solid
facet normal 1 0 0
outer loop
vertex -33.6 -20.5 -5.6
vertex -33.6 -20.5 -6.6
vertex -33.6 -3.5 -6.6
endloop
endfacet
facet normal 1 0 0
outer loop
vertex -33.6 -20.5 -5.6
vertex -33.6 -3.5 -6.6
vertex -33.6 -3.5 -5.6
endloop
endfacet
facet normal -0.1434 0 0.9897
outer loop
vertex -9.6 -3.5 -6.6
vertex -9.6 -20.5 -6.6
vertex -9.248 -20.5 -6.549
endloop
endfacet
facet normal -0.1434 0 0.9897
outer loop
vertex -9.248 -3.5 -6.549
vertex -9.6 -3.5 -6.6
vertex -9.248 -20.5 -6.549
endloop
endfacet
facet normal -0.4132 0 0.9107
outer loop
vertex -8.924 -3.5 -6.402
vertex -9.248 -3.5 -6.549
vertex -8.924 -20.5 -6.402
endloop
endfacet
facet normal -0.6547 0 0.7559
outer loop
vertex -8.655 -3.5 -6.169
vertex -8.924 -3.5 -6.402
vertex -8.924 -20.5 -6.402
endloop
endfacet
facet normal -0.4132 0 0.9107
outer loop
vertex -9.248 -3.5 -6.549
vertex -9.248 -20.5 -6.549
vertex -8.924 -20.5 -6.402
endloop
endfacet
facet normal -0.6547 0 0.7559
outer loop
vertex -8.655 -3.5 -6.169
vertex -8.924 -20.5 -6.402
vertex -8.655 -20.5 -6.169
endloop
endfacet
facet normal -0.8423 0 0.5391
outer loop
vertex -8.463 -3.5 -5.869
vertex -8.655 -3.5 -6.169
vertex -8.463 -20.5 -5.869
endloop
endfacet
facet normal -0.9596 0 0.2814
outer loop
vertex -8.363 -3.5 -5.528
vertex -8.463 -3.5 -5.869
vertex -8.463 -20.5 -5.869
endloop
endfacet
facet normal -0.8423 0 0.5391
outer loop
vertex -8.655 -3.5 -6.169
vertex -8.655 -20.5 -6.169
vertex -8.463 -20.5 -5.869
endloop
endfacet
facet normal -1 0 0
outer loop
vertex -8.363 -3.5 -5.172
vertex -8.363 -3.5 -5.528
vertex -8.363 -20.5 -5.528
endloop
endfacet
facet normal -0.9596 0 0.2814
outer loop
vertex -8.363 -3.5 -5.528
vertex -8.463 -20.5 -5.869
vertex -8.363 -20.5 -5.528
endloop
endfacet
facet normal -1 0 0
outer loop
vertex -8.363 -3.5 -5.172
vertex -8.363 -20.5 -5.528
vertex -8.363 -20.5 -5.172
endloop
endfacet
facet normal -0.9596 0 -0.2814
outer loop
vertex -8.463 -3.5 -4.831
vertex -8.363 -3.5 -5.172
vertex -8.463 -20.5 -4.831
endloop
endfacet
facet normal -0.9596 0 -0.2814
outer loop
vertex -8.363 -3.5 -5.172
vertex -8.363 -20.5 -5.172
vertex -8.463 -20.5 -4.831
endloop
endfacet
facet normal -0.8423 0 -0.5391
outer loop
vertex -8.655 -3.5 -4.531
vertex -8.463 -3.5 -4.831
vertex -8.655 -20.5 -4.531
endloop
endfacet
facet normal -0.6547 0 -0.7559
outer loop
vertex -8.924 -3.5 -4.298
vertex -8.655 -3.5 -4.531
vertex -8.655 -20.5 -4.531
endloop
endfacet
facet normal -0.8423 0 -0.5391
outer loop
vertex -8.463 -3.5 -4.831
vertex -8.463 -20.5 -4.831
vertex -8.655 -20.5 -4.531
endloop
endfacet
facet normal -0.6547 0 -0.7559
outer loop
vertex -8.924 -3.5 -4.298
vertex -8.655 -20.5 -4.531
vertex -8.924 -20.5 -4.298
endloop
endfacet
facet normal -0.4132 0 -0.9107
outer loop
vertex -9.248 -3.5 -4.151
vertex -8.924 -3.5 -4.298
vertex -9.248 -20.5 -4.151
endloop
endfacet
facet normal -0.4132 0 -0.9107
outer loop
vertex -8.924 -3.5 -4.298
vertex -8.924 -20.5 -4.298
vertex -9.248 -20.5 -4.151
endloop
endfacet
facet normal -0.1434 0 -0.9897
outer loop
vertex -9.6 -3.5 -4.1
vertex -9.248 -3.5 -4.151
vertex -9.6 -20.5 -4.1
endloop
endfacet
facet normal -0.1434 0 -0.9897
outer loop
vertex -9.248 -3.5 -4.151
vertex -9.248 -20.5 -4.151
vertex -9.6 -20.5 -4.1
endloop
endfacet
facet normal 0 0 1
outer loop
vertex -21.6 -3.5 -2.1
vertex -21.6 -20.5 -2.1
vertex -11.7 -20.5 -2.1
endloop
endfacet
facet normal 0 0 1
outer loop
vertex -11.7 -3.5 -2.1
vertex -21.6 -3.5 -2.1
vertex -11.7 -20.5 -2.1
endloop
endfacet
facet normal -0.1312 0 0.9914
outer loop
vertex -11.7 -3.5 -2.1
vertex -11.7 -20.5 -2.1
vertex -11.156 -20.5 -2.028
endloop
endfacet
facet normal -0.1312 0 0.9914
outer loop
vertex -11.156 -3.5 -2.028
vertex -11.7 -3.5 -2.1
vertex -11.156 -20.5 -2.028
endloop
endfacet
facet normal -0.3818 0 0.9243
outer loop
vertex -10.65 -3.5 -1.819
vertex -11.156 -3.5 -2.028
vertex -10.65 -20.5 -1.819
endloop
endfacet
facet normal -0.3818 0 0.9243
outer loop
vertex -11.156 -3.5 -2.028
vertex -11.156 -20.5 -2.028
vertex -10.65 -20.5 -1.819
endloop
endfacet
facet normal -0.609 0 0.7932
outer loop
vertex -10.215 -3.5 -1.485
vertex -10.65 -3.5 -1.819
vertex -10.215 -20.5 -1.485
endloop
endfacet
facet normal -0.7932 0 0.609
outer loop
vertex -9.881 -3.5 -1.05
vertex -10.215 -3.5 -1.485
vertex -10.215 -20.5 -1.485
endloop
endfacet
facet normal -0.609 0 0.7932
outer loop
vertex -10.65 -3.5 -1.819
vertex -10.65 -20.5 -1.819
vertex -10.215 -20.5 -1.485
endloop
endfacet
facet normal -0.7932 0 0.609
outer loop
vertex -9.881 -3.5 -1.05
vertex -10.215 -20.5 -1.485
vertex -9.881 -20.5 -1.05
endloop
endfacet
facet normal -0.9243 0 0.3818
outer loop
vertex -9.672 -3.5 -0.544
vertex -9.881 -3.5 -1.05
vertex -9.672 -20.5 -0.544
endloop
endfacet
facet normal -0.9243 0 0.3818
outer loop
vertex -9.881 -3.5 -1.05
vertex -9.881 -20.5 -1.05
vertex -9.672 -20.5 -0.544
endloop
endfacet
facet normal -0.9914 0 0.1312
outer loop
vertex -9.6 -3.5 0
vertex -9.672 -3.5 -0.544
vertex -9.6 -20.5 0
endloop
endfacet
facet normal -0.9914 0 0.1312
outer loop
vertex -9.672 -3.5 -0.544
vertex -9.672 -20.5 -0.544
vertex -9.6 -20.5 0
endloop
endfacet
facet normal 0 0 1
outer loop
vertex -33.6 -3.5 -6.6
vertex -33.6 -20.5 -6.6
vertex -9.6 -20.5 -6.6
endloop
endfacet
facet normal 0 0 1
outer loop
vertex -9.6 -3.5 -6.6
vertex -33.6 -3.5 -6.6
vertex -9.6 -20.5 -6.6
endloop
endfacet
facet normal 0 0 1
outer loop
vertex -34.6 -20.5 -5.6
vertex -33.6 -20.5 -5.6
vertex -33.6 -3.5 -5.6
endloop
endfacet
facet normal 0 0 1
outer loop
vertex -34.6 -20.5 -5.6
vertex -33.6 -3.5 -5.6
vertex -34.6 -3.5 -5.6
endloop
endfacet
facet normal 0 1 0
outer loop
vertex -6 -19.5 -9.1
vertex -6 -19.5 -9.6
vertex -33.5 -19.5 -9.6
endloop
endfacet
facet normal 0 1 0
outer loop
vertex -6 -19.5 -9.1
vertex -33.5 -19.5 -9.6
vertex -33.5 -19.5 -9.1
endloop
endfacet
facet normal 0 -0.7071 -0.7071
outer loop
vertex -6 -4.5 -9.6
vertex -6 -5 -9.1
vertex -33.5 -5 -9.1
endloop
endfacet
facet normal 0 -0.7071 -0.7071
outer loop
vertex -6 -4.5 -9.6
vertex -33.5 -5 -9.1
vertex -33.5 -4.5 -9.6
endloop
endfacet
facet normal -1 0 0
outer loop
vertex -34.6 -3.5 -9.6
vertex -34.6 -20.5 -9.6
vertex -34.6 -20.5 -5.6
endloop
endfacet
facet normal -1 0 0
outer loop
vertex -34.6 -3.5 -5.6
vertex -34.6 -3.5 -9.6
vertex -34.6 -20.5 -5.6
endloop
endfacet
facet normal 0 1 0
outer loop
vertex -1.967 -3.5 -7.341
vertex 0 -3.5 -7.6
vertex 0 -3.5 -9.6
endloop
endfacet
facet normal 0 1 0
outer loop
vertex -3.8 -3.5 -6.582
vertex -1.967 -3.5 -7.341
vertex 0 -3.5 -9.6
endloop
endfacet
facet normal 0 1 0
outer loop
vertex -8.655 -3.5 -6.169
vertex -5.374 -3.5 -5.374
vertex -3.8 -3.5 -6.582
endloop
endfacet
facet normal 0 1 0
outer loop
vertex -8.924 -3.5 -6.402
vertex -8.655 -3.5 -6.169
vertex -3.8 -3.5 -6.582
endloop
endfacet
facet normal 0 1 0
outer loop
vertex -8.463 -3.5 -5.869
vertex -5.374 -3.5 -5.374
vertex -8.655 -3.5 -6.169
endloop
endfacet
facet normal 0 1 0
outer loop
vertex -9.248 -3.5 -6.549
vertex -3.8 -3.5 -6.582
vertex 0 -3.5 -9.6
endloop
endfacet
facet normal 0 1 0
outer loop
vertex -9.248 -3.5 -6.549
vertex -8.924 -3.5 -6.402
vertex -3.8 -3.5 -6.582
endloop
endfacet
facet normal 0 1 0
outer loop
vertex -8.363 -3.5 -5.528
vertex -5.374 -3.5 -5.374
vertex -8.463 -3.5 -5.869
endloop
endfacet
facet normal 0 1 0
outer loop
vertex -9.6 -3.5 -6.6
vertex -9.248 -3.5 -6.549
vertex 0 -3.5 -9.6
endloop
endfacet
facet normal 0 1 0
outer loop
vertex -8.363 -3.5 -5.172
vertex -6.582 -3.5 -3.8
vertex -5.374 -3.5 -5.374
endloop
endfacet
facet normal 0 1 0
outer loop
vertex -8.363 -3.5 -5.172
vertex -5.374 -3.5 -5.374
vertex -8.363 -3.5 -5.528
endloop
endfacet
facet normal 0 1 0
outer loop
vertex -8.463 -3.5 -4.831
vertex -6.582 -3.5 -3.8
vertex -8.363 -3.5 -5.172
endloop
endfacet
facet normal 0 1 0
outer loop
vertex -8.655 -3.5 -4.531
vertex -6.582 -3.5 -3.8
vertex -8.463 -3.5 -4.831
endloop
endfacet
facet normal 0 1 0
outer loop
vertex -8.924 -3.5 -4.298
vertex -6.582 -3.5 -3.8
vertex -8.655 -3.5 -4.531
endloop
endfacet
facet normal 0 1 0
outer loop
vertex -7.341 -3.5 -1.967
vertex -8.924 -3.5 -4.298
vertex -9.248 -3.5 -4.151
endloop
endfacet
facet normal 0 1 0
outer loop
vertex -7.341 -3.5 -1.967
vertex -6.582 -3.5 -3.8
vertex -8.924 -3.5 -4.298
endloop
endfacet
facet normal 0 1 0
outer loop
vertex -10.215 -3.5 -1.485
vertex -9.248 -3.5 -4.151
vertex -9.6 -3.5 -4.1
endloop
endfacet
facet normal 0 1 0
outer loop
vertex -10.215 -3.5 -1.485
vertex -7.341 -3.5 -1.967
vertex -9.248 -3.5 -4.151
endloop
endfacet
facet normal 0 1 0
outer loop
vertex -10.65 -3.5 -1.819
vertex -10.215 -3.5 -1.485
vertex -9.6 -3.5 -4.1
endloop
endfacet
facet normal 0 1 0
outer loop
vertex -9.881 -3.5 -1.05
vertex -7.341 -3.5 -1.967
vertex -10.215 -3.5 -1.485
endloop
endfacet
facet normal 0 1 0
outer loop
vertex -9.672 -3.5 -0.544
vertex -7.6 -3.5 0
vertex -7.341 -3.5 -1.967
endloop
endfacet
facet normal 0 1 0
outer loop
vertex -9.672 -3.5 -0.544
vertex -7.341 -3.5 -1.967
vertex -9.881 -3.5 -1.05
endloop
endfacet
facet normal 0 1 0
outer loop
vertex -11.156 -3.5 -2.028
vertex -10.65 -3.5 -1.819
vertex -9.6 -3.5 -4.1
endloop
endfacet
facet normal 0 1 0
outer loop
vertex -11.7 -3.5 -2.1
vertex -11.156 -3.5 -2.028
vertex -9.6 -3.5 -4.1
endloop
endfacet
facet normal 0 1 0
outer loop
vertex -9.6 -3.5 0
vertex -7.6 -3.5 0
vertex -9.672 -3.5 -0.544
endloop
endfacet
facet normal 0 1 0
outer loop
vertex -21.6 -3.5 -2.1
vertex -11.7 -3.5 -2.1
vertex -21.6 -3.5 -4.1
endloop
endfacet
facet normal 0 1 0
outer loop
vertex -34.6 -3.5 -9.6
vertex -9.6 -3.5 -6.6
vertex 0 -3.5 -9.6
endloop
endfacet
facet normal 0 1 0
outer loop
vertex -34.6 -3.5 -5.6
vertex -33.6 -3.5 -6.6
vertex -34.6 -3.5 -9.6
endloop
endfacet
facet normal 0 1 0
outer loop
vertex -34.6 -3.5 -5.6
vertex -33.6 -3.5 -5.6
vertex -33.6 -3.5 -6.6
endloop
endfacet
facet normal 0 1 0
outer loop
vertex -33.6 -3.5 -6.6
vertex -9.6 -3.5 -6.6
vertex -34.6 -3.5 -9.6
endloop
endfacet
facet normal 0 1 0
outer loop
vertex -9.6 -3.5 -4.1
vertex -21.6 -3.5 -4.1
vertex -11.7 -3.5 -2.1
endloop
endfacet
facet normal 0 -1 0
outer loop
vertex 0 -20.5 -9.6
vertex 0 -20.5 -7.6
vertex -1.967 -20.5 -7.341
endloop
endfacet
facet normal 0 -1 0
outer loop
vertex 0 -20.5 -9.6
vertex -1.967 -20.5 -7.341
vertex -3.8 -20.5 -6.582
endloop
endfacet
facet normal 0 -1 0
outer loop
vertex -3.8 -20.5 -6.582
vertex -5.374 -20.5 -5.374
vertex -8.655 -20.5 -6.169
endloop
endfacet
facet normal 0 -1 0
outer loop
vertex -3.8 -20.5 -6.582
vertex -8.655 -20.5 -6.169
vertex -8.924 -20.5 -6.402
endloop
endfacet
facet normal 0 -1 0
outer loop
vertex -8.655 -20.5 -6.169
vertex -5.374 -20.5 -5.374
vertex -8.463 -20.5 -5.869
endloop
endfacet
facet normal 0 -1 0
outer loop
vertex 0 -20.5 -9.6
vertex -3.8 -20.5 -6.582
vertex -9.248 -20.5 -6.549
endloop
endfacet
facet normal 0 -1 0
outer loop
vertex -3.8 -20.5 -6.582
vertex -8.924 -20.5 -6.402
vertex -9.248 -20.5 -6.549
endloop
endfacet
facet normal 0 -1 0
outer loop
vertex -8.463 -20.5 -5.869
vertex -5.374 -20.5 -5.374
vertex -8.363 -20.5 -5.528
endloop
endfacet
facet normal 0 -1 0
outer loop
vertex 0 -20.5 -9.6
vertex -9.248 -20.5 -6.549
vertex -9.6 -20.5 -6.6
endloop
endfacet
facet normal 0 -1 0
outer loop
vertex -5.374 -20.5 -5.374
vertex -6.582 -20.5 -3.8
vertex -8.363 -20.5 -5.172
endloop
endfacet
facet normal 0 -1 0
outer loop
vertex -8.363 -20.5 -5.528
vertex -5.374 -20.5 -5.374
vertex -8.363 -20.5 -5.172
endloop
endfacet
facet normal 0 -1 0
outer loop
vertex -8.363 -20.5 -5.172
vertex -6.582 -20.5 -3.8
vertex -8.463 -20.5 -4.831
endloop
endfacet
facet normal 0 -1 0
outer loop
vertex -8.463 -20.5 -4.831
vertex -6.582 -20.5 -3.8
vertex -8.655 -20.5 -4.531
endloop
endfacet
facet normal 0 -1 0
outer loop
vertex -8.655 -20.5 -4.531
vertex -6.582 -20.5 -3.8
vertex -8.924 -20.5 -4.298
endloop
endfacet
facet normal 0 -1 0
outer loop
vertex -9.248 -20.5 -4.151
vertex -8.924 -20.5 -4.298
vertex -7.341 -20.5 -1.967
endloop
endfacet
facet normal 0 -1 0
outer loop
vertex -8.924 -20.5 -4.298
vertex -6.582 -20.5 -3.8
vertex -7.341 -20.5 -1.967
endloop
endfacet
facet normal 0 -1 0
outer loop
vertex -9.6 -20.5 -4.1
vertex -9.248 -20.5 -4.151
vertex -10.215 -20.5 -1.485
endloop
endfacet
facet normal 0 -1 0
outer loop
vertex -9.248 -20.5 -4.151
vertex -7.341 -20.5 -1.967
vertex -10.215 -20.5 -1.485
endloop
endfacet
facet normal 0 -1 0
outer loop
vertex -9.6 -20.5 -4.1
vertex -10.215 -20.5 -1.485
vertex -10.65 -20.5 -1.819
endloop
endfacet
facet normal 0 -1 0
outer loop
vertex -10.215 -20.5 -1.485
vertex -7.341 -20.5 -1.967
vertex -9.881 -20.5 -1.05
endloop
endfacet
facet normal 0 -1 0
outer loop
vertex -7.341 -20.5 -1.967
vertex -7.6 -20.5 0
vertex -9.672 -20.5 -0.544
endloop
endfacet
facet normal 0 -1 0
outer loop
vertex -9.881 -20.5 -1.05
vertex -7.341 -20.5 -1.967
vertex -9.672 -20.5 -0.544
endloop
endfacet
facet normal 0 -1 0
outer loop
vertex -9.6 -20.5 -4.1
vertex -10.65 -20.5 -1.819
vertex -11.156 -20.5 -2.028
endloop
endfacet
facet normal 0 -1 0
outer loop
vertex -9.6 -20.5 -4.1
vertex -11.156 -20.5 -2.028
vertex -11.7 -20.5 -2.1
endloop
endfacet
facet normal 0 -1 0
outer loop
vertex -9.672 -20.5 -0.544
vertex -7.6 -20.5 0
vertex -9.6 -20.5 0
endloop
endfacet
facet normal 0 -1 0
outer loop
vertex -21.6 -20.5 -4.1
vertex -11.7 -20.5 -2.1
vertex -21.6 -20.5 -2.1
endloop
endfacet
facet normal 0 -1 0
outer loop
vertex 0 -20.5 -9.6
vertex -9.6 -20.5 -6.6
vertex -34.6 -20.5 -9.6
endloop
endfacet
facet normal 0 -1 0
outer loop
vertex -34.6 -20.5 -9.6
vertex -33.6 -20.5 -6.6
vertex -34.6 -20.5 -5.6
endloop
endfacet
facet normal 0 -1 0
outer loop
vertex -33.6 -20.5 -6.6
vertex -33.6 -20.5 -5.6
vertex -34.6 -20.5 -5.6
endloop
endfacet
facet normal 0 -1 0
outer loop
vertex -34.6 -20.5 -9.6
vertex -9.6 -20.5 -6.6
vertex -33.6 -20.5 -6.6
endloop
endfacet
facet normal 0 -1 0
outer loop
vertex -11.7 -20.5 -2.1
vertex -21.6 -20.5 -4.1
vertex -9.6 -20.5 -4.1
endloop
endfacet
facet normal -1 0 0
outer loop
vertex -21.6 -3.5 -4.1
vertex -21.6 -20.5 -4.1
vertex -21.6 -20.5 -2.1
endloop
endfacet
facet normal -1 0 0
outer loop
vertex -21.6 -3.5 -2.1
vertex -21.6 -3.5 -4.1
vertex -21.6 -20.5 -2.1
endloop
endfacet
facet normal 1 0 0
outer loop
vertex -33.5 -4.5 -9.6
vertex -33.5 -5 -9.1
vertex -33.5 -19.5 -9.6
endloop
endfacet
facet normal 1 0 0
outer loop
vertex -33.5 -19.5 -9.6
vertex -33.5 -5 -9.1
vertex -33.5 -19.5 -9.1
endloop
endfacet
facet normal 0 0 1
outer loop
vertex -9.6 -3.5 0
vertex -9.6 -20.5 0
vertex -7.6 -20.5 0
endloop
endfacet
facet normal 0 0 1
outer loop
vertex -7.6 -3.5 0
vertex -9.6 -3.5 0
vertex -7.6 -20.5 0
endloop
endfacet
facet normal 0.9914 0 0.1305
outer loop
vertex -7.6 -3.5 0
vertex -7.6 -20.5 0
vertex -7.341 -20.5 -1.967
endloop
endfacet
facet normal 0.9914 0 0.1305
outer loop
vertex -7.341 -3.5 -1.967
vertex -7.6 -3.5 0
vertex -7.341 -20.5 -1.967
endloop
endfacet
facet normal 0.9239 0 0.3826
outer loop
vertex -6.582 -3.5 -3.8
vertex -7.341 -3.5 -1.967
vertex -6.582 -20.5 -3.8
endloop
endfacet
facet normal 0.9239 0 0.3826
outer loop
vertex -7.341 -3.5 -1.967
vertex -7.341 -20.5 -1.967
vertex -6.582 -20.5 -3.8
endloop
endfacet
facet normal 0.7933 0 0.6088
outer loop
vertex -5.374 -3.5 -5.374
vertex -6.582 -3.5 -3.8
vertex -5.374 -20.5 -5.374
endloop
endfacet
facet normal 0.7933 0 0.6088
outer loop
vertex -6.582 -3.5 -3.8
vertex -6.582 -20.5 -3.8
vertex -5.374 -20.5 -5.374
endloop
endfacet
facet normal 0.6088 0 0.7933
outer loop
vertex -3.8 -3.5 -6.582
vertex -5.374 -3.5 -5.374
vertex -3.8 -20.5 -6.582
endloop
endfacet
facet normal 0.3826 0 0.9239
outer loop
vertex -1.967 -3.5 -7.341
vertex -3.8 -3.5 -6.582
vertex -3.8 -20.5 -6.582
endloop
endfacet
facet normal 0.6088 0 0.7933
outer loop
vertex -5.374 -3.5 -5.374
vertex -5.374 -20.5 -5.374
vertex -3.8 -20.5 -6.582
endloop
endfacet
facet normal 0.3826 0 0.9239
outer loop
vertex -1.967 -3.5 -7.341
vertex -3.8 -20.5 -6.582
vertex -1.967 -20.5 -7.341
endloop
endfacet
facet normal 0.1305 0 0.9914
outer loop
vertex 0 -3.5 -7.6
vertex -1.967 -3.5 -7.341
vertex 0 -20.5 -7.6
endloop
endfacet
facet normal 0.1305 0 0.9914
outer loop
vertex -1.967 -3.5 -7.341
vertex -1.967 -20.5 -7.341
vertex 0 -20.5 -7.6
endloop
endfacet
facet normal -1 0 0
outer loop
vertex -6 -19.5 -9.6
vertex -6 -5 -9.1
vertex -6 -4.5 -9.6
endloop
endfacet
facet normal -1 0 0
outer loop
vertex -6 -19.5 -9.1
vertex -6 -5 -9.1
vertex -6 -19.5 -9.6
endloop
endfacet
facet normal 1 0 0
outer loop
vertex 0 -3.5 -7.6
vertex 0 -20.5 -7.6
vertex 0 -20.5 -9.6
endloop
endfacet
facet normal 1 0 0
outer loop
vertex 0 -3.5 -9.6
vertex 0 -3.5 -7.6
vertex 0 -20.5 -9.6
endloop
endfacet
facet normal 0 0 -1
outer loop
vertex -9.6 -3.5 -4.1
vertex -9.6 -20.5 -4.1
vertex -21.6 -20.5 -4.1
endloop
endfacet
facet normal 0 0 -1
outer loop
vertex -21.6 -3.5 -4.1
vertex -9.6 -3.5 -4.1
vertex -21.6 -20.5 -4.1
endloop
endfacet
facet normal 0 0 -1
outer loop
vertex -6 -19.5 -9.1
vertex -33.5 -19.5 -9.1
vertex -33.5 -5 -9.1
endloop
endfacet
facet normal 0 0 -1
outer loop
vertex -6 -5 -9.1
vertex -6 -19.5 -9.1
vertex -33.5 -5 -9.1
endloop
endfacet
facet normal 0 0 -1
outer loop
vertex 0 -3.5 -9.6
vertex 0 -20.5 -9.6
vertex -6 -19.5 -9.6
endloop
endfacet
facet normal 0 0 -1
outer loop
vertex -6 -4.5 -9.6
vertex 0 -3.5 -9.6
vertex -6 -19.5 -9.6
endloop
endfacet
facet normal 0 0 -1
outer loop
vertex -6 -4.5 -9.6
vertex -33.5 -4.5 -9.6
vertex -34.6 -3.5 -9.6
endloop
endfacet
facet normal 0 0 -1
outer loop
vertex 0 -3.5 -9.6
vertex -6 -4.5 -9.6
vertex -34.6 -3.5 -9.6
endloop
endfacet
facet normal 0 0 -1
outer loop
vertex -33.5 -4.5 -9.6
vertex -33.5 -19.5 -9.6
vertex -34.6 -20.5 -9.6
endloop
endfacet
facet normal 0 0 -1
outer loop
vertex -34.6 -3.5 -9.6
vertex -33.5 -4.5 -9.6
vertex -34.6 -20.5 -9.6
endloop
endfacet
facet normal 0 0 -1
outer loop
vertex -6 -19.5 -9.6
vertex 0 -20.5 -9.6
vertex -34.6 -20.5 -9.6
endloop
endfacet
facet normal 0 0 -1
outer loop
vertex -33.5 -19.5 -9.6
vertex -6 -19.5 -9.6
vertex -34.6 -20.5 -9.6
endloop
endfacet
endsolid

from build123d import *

# Parameters (mm, degrees)
EXTRUDE015_DEPTH = 27.5
EXTRUDE_DEPTH    = 17


with BuildPart() as extrude015:
    # Sketch020 → Extrude015 (new body)
    with BuildSketch(Plane(origin=(-6, 0, 0), x_dir=(0, -1, 0), z_dir=(-1, 0, 0))):
        Polygon((19.5, -10.1), (19.5, -9.1), (5, -9.1), (4, -10.1), align=None)
    extrude(amount=EXTRUDE015_DEPTH)


with BuildPart() as cut006:
    # Sketch001 → Extrude (new body)
    with BuildSketch(Plane.XZ.offset(25)):
        with BuildLine():
            ThreePointArc((-7.6, 0), (-5.374012, -5.374012), (0, -7.6))
            Line((0, -7.6), (0, -9.6))
            Line((0, -9.6), (-34.6, -9.6))
            Line((-34.6, -9.6), (-34.6, -5.6))
            Line((-33.6, -5.6), (-34.6, -5.6))
            Line((-33.6, -6.6), (-33.6, -5.6))
            Line((-33.6, -6.6), (-9.6, -6.6))
            ThreePointArc((-9.6, -6.6), (-8.35, -5.35), (-9.6, -4.1))
            Line((-9.6, -4.1), (-21.6, -4.1))
            Line((-21.6, -4.1), (-21.6, -2.1))
            Line((-21.6, -2.1), (-11.7, -2.1))
            ThreePointArc((-11.7, -2.1), (-10.215076, -1.484924), (-9.6, 0))
            Line((-9.6, 0), (-7.6, 0))
        make_face()
    extrude(amount=-EXTRUDE_DEPTH)


with BuildPart() as cut006_1:
    # Extrude placement: moved
    add(cut006.part.moved(Location((0, 4.5, 0))))

    # Cut006: cut Extrude015
    add(extrude015.part, mode=Mode.SUBTRACT)


solid = cut006_1.part
